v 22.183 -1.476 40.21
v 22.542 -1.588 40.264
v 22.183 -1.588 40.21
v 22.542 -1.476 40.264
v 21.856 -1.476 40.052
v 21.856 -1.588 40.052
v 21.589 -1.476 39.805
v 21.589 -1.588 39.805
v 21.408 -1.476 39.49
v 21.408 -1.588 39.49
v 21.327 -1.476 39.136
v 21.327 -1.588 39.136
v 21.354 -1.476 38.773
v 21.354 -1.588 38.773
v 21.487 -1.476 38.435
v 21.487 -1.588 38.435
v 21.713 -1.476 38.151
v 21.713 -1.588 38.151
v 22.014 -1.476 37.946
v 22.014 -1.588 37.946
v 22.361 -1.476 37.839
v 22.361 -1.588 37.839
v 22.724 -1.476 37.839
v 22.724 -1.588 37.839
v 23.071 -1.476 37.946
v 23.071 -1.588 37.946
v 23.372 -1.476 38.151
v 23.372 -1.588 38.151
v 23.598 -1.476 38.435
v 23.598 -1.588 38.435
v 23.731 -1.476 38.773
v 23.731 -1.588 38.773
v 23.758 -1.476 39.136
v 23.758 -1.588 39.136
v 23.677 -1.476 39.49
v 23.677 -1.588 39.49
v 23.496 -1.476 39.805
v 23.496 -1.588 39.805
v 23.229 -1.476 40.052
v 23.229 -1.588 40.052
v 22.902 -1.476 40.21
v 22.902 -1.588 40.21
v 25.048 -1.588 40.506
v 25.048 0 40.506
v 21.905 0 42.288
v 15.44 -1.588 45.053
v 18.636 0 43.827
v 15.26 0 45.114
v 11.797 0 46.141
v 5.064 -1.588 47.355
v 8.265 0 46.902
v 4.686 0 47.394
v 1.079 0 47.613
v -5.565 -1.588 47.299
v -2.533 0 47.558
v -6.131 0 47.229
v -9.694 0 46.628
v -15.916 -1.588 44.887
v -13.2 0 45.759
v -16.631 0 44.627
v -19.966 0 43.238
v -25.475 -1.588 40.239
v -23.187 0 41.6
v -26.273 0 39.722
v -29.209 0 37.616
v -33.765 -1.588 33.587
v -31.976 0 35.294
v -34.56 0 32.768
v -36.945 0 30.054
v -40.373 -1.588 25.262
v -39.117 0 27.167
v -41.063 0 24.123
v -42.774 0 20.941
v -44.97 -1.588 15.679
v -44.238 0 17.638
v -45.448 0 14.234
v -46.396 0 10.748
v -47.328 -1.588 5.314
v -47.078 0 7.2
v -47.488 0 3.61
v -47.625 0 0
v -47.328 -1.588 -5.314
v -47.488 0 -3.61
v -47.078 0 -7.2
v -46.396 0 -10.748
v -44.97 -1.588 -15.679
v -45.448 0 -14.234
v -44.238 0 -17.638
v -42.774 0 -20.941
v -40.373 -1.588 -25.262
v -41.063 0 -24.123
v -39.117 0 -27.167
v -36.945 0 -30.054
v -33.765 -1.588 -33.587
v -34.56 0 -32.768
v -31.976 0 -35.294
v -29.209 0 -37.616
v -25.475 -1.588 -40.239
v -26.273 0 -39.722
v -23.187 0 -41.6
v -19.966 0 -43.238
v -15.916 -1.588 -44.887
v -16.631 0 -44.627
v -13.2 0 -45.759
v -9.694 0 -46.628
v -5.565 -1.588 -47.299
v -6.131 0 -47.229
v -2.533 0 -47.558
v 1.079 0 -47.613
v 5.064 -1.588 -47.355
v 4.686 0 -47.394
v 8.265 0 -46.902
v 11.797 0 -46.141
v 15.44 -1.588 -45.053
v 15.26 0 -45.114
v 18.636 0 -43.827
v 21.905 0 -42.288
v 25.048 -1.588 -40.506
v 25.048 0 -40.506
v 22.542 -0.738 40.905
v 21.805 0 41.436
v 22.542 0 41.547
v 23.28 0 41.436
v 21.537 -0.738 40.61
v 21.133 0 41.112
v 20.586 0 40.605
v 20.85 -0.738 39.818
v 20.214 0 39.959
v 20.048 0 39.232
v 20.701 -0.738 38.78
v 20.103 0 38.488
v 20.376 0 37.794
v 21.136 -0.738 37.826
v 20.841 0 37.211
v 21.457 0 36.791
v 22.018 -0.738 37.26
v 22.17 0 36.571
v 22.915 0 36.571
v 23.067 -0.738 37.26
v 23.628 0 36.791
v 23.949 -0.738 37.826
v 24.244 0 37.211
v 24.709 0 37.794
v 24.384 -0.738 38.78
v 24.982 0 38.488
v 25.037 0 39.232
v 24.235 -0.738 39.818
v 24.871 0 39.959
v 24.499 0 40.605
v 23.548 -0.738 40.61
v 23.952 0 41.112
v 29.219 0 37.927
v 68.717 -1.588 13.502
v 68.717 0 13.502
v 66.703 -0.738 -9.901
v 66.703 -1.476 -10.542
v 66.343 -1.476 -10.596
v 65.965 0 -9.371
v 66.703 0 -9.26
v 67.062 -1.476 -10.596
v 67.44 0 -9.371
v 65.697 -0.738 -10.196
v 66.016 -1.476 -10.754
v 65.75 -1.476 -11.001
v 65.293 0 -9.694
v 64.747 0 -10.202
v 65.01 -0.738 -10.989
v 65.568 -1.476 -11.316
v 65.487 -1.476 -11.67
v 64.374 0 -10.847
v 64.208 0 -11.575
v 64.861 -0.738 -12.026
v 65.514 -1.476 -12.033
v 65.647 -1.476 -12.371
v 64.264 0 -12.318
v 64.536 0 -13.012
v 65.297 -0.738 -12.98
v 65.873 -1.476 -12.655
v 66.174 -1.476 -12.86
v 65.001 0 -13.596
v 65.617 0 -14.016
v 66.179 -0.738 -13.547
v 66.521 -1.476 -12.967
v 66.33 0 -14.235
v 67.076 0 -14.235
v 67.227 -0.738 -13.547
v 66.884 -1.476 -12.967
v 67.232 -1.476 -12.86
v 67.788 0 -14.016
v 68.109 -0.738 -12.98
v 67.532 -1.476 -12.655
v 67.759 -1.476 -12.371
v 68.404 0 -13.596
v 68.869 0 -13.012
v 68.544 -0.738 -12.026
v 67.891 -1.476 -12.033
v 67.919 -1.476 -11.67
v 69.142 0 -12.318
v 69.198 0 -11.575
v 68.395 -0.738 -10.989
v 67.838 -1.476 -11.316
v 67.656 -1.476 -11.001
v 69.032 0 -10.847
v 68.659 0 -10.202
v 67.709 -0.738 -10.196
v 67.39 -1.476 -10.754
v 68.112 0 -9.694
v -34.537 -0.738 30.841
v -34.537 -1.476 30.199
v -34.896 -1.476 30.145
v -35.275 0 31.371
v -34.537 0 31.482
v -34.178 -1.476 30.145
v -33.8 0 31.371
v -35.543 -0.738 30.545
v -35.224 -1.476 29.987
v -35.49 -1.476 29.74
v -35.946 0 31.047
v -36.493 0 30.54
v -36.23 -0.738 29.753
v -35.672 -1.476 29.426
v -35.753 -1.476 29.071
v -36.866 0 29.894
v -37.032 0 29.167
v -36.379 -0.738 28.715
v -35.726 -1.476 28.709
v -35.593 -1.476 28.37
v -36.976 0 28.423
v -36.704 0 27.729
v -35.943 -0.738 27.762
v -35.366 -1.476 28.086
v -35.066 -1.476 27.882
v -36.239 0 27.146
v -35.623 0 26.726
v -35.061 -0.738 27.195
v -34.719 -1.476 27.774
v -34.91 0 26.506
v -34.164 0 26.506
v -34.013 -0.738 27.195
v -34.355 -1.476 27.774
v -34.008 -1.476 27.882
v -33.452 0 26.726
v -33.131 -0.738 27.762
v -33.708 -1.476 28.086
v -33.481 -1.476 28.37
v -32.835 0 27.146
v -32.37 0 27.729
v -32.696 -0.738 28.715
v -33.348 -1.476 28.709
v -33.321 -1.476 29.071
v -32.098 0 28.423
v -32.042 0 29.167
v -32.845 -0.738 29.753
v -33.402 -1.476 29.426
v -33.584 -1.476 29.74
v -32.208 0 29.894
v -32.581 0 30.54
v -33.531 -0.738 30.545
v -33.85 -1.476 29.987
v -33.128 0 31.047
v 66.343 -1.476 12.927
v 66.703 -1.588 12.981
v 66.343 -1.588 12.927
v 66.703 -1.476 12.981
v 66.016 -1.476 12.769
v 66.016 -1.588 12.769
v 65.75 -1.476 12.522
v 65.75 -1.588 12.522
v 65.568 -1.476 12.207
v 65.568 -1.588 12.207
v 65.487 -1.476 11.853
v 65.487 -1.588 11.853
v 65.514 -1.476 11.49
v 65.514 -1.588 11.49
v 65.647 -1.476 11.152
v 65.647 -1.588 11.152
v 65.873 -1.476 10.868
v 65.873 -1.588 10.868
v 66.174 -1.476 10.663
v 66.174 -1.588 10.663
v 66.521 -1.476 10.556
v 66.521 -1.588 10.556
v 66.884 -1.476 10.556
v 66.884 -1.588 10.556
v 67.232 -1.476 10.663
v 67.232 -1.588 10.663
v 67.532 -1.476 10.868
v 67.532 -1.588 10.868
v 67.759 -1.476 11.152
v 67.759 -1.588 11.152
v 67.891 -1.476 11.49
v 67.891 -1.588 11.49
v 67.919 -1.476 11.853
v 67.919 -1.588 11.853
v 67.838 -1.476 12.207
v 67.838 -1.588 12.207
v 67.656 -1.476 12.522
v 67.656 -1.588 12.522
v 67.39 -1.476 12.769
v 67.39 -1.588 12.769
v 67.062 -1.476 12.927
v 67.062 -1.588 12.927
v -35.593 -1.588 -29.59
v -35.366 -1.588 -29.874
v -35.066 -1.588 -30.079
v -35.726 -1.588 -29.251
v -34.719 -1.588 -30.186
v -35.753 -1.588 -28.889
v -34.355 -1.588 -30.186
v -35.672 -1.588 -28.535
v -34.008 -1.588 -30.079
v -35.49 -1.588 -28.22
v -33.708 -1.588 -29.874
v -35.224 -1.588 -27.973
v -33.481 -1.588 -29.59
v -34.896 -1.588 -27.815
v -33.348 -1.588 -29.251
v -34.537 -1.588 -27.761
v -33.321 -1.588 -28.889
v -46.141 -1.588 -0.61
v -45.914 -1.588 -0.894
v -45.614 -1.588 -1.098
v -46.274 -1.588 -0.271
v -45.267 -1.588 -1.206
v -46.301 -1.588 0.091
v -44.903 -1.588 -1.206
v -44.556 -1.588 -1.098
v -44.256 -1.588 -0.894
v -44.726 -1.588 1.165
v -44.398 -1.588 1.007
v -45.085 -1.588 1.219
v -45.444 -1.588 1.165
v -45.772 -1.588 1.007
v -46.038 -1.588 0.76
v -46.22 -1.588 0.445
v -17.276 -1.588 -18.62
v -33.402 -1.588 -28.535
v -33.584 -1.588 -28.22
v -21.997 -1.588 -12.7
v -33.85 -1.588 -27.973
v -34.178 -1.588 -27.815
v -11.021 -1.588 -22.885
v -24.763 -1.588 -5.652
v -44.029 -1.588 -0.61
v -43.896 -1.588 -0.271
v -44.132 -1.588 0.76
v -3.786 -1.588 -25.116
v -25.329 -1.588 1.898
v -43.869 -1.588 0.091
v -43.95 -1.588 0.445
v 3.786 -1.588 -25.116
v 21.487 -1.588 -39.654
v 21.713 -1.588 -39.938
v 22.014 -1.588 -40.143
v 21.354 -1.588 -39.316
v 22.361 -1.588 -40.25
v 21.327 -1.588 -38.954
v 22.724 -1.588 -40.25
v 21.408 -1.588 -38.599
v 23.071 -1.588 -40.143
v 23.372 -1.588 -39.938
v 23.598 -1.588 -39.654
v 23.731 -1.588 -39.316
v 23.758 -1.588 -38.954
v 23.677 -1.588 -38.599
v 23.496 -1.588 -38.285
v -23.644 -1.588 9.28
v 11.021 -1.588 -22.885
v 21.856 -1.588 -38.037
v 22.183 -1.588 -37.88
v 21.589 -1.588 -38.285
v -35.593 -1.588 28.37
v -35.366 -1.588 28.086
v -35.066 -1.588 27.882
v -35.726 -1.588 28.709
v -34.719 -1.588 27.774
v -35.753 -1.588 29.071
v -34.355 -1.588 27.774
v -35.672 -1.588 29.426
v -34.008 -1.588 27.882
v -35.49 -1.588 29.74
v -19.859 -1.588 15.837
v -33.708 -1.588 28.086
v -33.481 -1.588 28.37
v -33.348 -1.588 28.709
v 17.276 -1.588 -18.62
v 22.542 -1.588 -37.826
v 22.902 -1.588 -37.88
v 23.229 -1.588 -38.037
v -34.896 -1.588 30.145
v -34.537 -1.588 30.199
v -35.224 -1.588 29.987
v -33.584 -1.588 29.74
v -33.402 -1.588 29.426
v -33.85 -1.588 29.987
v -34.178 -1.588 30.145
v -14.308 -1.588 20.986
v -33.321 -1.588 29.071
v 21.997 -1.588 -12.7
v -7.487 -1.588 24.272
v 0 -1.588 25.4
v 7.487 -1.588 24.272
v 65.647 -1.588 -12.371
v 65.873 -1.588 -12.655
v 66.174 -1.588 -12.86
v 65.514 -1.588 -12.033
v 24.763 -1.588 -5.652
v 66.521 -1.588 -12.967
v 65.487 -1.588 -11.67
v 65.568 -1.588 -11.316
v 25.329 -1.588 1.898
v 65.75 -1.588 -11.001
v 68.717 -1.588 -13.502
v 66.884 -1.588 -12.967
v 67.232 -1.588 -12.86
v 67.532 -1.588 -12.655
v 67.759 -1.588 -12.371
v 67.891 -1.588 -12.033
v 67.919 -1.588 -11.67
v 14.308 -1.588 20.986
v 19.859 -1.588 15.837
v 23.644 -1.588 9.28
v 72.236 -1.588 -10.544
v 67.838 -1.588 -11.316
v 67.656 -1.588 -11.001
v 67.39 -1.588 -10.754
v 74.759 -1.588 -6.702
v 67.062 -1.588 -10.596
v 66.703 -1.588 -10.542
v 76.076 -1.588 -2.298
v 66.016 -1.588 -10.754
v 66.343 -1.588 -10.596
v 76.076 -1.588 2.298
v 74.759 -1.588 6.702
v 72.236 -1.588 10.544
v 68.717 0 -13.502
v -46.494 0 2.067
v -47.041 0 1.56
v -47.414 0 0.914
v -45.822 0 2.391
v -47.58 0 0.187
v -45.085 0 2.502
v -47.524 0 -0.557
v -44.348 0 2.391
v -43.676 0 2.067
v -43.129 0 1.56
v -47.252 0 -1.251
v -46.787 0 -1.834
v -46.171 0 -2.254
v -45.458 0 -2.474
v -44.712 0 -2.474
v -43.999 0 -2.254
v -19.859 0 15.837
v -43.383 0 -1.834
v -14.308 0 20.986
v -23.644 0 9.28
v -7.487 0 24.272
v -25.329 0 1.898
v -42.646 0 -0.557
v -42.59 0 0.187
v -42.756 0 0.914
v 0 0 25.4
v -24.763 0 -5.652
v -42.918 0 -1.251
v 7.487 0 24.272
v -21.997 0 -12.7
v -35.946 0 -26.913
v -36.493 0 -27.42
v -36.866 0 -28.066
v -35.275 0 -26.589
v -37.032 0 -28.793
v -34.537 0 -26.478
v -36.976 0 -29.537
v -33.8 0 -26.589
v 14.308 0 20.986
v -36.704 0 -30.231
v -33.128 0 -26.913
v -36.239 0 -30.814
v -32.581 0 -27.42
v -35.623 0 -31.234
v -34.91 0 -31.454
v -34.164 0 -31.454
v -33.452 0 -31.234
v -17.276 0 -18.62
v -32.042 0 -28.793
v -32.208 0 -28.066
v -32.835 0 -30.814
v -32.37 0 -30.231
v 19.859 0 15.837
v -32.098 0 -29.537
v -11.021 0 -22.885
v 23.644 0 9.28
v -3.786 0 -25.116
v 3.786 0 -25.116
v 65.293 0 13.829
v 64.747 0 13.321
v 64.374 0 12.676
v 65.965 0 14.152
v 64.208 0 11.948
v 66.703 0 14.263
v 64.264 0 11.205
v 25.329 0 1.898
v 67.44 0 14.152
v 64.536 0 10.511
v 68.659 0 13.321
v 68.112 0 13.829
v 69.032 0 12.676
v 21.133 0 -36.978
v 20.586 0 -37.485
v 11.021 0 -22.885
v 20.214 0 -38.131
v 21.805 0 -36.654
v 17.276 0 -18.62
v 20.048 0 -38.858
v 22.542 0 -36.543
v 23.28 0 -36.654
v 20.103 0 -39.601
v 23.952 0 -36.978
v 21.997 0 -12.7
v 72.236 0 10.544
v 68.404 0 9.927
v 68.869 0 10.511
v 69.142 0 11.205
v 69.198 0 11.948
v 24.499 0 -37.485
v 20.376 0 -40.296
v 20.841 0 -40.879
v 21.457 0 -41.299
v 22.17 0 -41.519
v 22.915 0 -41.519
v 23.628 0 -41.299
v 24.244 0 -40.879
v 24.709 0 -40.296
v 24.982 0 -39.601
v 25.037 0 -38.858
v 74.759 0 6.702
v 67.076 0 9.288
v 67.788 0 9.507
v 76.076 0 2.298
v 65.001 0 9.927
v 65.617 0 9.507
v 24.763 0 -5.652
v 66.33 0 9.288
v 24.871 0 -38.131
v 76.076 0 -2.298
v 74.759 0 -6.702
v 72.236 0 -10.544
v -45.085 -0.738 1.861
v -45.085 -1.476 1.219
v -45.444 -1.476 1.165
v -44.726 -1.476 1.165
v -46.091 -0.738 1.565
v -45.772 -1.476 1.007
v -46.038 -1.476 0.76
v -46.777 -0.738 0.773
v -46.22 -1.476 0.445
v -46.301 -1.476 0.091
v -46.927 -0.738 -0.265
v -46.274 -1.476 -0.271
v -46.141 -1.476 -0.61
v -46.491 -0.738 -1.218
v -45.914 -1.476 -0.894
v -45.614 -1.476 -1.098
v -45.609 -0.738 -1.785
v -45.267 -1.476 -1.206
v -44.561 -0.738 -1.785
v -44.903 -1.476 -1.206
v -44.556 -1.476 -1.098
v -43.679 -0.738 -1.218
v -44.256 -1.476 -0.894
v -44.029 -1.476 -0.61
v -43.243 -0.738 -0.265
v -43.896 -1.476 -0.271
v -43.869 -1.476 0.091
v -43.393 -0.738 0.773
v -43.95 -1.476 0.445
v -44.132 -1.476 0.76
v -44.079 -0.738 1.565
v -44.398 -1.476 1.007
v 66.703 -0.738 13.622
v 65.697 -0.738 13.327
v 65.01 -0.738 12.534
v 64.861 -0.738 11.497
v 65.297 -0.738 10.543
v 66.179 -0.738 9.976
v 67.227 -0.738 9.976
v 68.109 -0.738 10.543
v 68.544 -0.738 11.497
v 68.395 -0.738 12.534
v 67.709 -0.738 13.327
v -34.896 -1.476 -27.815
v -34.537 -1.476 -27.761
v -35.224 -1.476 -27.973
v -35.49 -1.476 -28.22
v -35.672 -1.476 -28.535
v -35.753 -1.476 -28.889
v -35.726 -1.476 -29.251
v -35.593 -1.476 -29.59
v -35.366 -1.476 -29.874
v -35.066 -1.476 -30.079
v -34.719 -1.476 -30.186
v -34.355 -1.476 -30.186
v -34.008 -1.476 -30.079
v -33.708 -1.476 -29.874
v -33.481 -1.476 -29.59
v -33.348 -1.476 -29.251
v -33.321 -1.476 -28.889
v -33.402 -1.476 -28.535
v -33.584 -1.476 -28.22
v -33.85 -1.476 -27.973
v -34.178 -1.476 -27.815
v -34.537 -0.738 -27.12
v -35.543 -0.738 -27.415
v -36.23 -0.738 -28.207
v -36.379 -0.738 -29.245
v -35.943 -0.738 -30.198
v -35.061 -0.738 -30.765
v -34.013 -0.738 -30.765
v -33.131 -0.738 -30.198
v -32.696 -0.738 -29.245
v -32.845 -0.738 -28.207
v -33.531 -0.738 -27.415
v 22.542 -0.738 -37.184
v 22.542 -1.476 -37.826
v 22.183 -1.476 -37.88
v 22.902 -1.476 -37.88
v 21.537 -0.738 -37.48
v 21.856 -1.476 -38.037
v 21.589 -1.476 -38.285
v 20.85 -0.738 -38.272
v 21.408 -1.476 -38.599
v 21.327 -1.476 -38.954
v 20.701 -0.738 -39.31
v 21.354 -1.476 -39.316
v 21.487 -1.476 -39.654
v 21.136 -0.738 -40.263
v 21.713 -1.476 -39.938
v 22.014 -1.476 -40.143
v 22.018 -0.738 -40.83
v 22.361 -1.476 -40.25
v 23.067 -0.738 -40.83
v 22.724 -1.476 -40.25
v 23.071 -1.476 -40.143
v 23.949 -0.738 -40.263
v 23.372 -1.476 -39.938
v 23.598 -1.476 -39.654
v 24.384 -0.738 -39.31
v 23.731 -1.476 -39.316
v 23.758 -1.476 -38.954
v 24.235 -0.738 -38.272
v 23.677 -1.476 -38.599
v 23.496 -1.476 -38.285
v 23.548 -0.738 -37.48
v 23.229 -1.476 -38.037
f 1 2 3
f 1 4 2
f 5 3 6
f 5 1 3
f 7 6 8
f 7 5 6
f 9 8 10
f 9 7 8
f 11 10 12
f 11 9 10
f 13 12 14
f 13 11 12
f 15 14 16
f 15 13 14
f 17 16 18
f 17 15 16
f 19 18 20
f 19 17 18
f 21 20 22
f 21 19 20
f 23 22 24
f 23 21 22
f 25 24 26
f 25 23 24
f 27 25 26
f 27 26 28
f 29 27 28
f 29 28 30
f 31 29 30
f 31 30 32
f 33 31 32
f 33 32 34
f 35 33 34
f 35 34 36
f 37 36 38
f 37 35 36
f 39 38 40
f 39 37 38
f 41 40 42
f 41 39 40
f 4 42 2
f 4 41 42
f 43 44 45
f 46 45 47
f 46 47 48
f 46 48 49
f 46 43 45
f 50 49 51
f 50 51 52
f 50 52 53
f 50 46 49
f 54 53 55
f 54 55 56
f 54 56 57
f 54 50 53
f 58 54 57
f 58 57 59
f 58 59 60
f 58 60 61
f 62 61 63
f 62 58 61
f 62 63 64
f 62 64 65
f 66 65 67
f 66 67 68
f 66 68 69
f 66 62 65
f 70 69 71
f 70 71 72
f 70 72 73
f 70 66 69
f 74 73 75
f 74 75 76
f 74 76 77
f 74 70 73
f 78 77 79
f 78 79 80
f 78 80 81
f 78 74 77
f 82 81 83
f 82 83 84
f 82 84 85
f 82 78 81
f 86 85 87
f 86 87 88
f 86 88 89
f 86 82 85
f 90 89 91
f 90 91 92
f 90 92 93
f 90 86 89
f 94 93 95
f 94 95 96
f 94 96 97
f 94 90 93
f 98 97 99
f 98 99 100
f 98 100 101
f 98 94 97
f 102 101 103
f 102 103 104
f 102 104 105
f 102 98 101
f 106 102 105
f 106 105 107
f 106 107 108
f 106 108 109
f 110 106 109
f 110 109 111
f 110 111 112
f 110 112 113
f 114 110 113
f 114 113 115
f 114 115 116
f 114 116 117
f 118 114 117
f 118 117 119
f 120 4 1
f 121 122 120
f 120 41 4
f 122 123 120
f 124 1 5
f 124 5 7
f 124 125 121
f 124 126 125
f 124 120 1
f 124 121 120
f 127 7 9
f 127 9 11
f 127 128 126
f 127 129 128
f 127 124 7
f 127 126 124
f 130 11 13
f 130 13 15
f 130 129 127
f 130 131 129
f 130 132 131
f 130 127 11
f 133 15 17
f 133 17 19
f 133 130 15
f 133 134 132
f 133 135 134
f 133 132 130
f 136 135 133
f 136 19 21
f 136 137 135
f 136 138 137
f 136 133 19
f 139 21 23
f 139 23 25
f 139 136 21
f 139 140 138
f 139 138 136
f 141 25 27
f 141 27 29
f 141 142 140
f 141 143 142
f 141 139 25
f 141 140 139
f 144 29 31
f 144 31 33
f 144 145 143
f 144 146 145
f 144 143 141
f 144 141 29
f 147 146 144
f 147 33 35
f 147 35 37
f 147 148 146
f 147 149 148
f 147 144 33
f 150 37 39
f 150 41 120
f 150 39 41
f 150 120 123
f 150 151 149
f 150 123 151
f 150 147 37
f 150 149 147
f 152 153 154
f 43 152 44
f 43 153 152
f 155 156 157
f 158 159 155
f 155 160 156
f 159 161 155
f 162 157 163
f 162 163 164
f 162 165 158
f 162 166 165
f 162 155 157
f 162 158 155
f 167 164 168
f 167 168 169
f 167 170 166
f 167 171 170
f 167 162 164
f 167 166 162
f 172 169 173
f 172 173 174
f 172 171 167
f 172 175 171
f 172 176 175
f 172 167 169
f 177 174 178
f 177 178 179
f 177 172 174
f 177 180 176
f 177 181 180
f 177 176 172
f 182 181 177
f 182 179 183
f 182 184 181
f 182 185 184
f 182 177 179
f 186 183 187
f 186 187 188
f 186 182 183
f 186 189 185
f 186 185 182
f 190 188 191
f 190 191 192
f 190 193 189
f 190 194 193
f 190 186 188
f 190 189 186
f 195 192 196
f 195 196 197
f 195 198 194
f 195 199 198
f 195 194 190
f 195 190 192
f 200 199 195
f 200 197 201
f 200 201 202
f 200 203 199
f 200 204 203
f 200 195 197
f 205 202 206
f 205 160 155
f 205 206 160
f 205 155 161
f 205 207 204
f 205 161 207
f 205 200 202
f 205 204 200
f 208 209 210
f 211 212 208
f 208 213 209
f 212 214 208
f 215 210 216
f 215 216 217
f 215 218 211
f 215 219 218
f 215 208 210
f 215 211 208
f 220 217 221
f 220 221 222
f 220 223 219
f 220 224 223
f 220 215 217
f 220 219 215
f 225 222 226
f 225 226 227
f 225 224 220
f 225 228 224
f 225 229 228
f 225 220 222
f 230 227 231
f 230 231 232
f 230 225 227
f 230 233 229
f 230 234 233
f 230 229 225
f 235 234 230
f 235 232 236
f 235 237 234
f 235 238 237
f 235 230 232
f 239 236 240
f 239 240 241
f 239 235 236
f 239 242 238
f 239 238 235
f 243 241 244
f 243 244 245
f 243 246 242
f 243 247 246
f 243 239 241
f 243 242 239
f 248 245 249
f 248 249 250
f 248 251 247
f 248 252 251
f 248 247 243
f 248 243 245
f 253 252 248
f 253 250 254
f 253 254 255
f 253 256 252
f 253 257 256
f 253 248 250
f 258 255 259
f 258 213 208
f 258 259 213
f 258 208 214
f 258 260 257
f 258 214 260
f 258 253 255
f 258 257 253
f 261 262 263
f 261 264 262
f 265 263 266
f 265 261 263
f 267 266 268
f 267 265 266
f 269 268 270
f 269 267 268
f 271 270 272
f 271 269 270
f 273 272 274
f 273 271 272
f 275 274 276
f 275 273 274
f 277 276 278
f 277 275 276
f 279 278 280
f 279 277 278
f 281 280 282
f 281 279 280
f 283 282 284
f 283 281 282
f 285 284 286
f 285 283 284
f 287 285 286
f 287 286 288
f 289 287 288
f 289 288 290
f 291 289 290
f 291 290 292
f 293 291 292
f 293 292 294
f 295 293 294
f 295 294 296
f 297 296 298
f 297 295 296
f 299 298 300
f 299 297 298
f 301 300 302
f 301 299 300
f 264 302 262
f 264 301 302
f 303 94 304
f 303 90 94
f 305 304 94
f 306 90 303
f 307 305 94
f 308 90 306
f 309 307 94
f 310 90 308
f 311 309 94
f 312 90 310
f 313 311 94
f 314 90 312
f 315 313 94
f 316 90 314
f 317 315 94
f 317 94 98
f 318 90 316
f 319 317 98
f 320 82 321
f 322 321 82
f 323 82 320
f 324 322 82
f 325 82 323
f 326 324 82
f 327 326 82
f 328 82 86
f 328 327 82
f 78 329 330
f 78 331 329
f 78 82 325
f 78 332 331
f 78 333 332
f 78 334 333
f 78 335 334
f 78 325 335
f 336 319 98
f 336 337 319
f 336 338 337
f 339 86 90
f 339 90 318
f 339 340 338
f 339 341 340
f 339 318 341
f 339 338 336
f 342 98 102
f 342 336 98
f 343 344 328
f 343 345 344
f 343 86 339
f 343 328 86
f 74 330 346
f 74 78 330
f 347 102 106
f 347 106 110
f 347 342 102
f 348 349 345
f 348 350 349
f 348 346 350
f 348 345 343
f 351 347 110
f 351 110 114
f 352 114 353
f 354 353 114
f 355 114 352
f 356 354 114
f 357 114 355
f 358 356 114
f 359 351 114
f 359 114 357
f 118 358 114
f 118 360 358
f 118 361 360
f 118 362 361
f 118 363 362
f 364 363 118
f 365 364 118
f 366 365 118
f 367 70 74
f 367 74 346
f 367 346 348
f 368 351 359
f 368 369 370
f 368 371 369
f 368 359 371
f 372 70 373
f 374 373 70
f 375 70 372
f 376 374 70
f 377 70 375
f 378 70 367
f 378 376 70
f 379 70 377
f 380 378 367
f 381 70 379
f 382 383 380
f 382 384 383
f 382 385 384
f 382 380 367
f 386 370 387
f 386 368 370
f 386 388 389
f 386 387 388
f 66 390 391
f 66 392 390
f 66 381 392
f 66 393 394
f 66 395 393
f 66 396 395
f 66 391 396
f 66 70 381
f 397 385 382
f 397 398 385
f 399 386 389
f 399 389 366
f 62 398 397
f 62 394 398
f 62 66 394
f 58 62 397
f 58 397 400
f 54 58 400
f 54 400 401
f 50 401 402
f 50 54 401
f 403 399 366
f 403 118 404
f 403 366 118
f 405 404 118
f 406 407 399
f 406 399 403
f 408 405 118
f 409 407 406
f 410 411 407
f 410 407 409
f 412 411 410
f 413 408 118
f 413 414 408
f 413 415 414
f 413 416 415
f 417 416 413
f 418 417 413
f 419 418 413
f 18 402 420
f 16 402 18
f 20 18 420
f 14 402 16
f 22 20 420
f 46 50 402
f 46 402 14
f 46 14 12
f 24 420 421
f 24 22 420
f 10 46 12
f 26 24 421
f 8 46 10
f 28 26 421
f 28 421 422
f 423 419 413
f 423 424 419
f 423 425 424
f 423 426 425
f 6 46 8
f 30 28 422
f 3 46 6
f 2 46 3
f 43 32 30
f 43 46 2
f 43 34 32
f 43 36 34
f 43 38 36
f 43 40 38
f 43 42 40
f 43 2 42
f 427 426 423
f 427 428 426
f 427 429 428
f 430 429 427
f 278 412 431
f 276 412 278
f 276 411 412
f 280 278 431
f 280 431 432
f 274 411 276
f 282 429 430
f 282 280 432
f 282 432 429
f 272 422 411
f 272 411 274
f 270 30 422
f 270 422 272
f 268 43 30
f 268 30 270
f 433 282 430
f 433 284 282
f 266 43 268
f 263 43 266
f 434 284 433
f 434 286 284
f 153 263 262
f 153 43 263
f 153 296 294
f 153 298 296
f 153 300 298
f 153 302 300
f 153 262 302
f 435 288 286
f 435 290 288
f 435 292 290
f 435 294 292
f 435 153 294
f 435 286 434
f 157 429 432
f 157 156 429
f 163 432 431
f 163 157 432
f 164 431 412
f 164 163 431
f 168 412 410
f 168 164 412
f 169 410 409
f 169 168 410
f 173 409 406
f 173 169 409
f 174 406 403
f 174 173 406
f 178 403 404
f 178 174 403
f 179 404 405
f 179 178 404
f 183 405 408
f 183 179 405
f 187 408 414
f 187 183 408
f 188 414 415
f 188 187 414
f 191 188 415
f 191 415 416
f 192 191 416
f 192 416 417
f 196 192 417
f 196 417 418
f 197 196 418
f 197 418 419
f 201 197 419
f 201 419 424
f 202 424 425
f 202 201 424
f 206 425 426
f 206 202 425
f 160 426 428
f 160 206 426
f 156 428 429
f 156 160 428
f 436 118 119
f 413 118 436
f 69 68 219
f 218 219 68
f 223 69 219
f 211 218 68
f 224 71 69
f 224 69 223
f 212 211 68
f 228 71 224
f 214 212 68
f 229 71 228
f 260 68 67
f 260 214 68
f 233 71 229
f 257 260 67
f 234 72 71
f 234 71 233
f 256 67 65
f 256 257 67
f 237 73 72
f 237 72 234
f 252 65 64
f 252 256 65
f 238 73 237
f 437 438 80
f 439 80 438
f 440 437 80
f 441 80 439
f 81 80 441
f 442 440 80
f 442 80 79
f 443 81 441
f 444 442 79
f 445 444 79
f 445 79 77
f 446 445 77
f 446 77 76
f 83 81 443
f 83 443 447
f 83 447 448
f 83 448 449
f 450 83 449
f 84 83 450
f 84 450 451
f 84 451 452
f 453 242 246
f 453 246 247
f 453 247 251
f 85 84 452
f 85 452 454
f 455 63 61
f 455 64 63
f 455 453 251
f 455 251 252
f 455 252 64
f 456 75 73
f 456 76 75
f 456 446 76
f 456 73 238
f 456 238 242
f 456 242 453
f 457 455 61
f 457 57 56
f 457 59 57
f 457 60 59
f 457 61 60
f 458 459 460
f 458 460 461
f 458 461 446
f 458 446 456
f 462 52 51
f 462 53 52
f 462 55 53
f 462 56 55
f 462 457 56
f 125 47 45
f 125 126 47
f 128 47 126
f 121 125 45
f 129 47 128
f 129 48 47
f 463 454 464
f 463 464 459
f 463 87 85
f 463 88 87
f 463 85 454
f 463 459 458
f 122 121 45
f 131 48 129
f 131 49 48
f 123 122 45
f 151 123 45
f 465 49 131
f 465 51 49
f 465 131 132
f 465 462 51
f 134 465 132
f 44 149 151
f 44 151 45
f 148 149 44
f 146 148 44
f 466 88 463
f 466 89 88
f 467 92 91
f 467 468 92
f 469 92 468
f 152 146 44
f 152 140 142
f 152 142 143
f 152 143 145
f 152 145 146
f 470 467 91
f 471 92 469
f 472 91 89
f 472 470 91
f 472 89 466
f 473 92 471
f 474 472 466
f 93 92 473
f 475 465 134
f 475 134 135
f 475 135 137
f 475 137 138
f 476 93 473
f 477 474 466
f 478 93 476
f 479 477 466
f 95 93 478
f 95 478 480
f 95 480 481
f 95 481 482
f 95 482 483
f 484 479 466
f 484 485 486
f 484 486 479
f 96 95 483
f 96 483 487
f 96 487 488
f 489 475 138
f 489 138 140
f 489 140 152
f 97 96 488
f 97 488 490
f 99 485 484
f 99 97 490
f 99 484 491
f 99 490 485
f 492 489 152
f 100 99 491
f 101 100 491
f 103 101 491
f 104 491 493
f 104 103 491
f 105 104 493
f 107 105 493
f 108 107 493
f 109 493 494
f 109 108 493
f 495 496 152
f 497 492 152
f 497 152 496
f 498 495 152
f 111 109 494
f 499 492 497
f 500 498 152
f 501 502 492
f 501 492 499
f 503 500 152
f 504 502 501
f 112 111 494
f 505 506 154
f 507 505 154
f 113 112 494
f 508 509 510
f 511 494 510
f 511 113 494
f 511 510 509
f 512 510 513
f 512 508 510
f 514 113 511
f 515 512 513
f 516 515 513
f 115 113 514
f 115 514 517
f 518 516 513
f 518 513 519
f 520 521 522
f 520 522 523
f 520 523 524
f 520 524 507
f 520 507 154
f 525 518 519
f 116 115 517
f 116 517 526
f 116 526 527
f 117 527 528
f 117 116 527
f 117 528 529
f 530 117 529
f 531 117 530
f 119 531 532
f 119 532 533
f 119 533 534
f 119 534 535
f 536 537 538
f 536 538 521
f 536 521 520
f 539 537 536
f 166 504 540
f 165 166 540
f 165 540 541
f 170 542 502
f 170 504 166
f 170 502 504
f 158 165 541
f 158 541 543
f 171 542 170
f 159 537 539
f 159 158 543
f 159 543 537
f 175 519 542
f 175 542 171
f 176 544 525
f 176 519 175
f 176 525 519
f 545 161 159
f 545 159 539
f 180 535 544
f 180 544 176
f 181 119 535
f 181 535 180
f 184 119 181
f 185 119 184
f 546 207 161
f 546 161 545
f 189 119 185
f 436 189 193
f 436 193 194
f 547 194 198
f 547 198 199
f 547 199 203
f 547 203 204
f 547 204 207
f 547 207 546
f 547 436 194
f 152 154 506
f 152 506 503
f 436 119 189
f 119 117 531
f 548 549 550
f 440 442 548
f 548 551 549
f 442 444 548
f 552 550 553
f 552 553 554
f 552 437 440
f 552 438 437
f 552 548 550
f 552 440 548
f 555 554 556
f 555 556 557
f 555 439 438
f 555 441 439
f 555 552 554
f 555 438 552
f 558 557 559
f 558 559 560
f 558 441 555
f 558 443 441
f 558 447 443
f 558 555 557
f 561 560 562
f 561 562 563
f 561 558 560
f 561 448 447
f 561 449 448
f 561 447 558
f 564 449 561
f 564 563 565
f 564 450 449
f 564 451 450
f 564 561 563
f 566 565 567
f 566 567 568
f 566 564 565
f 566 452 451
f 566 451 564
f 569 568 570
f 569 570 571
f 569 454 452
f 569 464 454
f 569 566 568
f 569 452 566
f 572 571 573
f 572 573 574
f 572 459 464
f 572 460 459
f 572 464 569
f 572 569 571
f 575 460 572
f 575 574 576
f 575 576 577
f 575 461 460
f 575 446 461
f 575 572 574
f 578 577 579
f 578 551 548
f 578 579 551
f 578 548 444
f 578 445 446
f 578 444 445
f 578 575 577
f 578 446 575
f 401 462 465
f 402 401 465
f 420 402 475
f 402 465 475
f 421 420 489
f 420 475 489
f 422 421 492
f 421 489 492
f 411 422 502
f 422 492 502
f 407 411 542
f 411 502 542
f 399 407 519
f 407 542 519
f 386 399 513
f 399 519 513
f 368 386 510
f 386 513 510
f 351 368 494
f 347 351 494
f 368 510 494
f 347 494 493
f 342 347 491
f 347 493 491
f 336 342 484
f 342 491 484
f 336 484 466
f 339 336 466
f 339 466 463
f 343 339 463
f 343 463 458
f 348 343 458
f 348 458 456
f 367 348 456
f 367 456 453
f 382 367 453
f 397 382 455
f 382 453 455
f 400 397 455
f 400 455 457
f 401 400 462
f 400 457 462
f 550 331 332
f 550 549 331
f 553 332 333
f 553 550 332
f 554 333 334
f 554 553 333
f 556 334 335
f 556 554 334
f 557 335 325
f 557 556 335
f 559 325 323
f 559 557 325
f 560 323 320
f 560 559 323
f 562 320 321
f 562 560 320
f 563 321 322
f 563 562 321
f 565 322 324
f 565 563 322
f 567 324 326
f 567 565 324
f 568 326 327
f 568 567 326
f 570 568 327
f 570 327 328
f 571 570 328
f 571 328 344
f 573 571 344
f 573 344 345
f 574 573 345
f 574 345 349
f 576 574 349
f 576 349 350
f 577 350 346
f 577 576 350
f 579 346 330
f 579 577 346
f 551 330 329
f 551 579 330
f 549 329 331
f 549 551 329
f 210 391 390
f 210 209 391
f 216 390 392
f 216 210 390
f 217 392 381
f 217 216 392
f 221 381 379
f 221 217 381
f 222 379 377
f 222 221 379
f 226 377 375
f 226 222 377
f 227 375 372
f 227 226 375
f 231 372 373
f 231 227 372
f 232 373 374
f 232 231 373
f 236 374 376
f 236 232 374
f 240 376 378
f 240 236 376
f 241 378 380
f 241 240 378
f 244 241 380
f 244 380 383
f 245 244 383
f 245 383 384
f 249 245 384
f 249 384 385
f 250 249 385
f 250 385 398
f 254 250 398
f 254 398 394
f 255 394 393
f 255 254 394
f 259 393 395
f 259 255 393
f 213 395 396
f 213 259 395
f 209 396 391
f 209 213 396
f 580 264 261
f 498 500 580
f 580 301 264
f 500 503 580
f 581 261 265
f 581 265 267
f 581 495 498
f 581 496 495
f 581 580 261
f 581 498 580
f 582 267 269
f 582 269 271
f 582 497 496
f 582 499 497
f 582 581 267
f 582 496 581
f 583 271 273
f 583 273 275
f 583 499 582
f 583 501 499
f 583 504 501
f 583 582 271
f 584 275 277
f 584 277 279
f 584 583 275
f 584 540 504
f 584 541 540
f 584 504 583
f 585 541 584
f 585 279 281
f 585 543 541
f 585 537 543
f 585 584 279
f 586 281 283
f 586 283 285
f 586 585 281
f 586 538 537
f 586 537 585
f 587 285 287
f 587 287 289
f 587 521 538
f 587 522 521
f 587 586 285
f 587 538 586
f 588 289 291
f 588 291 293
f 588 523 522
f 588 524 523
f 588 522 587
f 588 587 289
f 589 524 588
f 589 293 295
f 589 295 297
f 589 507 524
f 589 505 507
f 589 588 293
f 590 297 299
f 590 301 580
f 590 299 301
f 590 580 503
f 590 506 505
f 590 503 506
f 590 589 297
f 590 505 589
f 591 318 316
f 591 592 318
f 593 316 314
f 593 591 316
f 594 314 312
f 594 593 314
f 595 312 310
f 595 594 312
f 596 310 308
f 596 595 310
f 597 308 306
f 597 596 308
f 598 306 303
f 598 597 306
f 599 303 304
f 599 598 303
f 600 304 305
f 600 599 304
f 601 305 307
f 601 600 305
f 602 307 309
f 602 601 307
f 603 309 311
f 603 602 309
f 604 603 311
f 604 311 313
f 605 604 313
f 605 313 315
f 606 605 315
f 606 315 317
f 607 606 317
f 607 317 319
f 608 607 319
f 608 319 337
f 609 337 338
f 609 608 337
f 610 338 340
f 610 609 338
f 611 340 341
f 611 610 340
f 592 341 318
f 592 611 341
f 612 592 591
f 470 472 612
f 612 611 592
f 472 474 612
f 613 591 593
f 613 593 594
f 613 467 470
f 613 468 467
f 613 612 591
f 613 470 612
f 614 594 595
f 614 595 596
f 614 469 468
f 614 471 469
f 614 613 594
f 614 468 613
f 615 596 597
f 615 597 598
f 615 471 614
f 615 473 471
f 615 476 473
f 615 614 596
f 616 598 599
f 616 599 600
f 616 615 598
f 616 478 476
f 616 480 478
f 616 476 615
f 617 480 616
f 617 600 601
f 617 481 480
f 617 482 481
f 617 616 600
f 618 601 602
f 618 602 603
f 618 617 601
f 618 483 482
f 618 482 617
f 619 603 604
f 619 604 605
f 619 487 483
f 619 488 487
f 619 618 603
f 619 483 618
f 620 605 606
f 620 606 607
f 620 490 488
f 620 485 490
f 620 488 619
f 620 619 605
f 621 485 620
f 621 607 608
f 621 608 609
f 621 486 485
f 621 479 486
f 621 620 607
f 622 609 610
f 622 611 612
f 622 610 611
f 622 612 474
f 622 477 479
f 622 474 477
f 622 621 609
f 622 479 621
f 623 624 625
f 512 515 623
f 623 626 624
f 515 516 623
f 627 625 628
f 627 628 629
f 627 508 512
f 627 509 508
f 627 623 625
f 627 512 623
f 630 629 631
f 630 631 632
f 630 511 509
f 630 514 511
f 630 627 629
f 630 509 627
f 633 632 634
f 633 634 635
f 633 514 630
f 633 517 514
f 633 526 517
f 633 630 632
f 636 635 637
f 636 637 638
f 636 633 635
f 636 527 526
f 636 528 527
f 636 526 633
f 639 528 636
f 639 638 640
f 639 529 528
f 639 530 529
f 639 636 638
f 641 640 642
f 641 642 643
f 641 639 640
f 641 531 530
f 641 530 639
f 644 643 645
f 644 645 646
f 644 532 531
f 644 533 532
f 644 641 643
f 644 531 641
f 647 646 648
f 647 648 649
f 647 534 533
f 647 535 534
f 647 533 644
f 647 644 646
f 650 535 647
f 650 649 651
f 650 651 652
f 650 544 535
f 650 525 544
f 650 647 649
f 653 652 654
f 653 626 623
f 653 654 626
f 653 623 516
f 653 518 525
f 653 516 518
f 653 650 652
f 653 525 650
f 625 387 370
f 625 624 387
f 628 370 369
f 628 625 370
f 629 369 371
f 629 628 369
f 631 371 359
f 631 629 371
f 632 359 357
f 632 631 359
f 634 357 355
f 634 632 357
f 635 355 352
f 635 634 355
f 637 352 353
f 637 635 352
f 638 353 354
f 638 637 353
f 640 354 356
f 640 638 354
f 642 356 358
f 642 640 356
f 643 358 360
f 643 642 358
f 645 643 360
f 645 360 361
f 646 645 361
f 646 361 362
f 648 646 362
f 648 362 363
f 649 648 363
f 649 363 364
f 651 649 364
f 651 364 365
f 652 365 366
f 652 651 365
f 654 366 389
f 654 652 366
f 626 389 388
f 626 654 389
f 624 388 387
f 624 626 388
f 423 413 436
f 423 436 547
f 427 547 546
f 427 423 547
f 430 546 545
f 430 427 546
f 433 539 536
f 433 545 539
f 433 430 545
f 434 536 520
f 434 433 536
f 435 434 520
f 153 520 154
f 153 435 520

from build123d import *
from build123d.topology import SkipClean

# Parameters (mm, degrees)
SKETCH1_R                                         = 47.625
BOSS_EXTRUDE1_DEPTH                               = 24.13
SKETCH2_R                                         = 46.0375
CUT_EXTRUDE1_DEPTH                                = 20.955
SKETCH3_R                                         = 30.48
CUT_EXTRUDE2_DEPTH                                = 71.536467696
BOSS_EXTRUDE2_START                               = -24.13
BOSS_EXTRUDE2_DEPTH                               = 24.13
CUT_EXTRUDE3_DEPTH                                = 20.955
BOSS_EXTRUDE3_START                               = 3.81
BOSS_EXTRUDE3_DEPTH                               = 3.81
SKETCH7_R                                         = 11.176
CUT_EXTRUDE4_DEPTH                                = 3.81
CHAMFER1_SIZE                                     = 0.762
SKETCH8_R                                         = 5.08
CUT_EXTRUDE5_DEPTH                                = 93.163254725
CSK_FOR_M2_5_FLAT_HEAD_MACHINE_SCREW1_D           = 2.9
CSK_FOR_M2_5_FLAT_HEAD_MACHINE_SCREW1_CSINK_D     = 5.5
CSK_FOR_M2_5_FLAT_HEAD_MACHINE_SCREW1_CSINK_ANGLE = 90
CIRPATTERN1_COUNT                                 = 3
BOSS_EXTRUDE4_DEPTH                               = 5.588
SKETCH12_R                                        = 32.0675
SKETCH12_R_2                                      = 30.48
BOSS_EXTRUDE5_DEPTH                               = 5.588
FILLET2_R                                         = 3.175
F_10_32_TAPPED_HOLE1_D                            = 4.0386
CIRPATTERN2_COUNT                                 = 6
BOSS_EXTRUDE6_REACH                               = 96.68
SKETCH19_R                                        = 2.54
FILLET3_R                                         = 3.175
F_4_40_TAPPED_HOLE1_D                             = 2.2606
F_4_40_TAPPED_HOLE1_DEPTH                         = 7.62
F_4_40_TAPPED_HOLE1_TIP                           = 0.679152758
BOSS_EXTRUDE8_START                               = 1.5875
BOSS_EXTRUDE8_DEPTH                               = 1.5875
CUT_EXTRUDE6_START                                = -29.718
CUT_EXTRUDE6_DEPTH                                = 29.718
CSK_FOR_2_FLAT_HEAD_SOCKET_CAP_SCREW1_A_COUNT     = 2
CSK_FOR_2_FLAT_HEAD_SOCKET_CAP_SCREW1_A_PITCH     = 57.960158765
CSK_FOR_2_FLAT_HEAD_SOCKET_CAP_SCRE_2_COUNT       = 2
CSK_FOR_2_FLAT_HEAD_SOCKET_CAP_SCRE_2_PITCH       = 78.089510659
CSK_FOR_2_FLAT_HEAD_SOCKET_CAP_SCRE_3_COUNT       = 2
CSK_FOR_2_FLAT_HEAD_SOCKET_CAP_SCRE_3_PITCH       = 88.800115089
CSK_FOR_2_FLAT_HEAD_SOCKET_CAP_SCRE_4_COUNT       = 2
CSK_FOR_2_FLAT_HEAD_SOCKET_CAP_SCRE_4_PITCH       = 78.089510659
CSK_FOR_2_FLAT_HEAD_SOCKET_CAP_SCRE_5_COUNT       = 2
CSK_FOR_2_FLAT_HEAD_SOCKET_CAP_SCRE_5_PITCH       = 67.315682226
CSK_FOR_2_FLAT_HEAD_SOCKET_CAP_SCRE_6_COUNT       = 2
CSK_FOR_2_FLAT_HEAD_SOCKET_CAP_SCRE_6_PITCH       = 51.908600383
SKETCH26_R                                        = 25.4
CUT_EXTRUDE7_DEPTH                                = 1.5875


with BuildPart() as part:
    # Sketch1 → Boss-Extrude1 (new body)
    with BuildSketch(Plane(origin=(0, 0, 0), x_dir=(1, 0, 0), z_dir=(0, 1, 0))):
        with Locations(Location((0, 0, 0), (0, 0, 90))):
            Circle(SKETCH1_R)
    extrude(amount=BOSS_EXTRUDE1_DEPTH)

    # Sketch2 → Cut-Extrude1 (cut)
    with BuildSketch(Plane.XZ):
        with Locations(Location((0, 0, 0), (0, 0, 270))):
            Circle(SKETCH2_R)
    extrude(amount=-CUT_EXTRUDE1_DEPTH, mode=Mode.SUBTRACT)

    # Sketch3 → Cut-Extrude2 (cut, through all)
    with BuildSketch(Plane.XZ.offset(-20.955)):
        with Locations(Location((0, 0, 0), (0, 0, 270))):
            Circle(SKETCH3_R)
    extrude(amount=-CUT_EXTRUDE2_DEPTH, mode=Mode.SUBTRACT)

    # Sketch4 → Boss-Extrude2 (add)
    with BuildSketch(Plane(origin=(0, 24.13, 0), x_dir=(1, 0, 0), z_dir=(0, 1, 0)).offset(BOSS_EXTRUDE2_START)):
        with BuildLine():
            Line((25.047860479, 40.506114482), (68.717466826, 13.502038161))
            ThreePointArc((68.717466826, 13.502038161), (76.24318, 0), (68.717466826, -13.502038161))
            Line((68.717466826, -13.502038161), (25.047860479, -40.506114482))
            ThreePointArc((25.047860479, -40.506114482), (47.625, 0), (25.047860479, 40.506114482))
        make_face()
    extrude(amount=BOSS_EXTRUDE2_DEPTH)

    # Sketch5 → Cut-Extrude3 (cut)
    with BuildSketch(Plane.XZ):
        with BuildLine():
            Line((24.212931796, -39.155910666), (67.882538144, -12.151834345))
            ThreePointArc((67.882538144, -12.151834345), (74.65568, 0), (67.882538144, 12.151834345))
            Line((67.882538144, 12.151834345), (24.212931796, 39.155910666))
            ThreePointArc((24.212931796, 39.155910666), (46.0375, 0), (24.212931796, -39.155910666))
        make_face()
    extrude(amount=-CUT_EXTRUDE3_DEPTH, mode=Mode.SUBTRACT)

    # Sketch6 → Boss-Extrude3 (add)
    with BuildSketch(Plane.XZ.offset(-20.955).offset(BOSS_EXTRUDE3_START)):
        with BuildLine():
            Line((53.153553418, 21.25983098), (46.04773497, 25.653872505))
            Line((46.04773497, 25.653872505), (46.882663653, 27.004076321))
            Line((46.882663653, 27.004076321), (68.717466826, 13.502038161))
            ThreePointArc((68.717466826, 13.502038161), (76.24318, 0), (68.717466826, -13.502038161))
            Line((68.717466826, -13.502038161), (46.882663653, -27.004076321))
            Line((46.882663653, -27.004076321), (46.04773497, -25.653872505))
            Line((46.04773497, -25.653872505), (53.153553418, -21.25983098))
            ThreePointArc((53.153553418, -21.25983098), (56.162954155, -15.965000538), (53.331952458, -10.572677144))
            ThreePointArc((53.331952458, -10.572677144), (47.66818, 0), (53.331952458, 10.572677144))
            ThreePointArc((53.331952458, 10.572677144), (56.162954155, 15.965000538), (53.153553418, 21.25983098))
        make_face()
    extrude(amount=-BOSS_EXTRUDE3_DEPTH)

    # Sketch7 → Cut-Extrude4 (cut)
    with BuildSketch(Plane(origin=(0, 24.13, 0), x_dir=(1, 0, 0), z_dir=(0, 1, 0))):
        with Locations(Location((60.36818, 0, 0), (0, 0, 270))):
            Circle(SKETCH7_R)
    extrude(amount=-CUT_EXTRUDE4_DEPTH, mode=Mode.SUBTRACT)

    # Chamfer1
    chamfer1_edges = [part.edges().sort_by_distance(p)[0] for p in [
        (60.36818, 24.13, -11.176),
    ]]
    chamfer(chamfer1_edges, length=CHAMFER1_SIZE)

    # Sketch8 → Cut-Extrude5 (cut, through all)
    with BuildSketch(Plane(origin=(0, 20.32, 0), x_dir=(1, 0, 0), z_dir=(0, 1, 0))):
        with Locations(Location((60.36818, 0, 0), (0, 0, 270))):
            Circle(SKETCH8_R)
    extrude(amount=-CUT_EXTRUDE5_DEPTH, mode=Mode.SUBTRACT)

    # CSK for M2.5 Flat Head Machine Screw1 (through all)
    with Locations(Plane.XZ.offset(-17.145)):
        with Locations((67.36818, 0)):
            csk_for_m2_5_flat_head_machine_screw1 = CounterSinkHole(CSK_FOR_M2_5_FLAT_HEAD_MACHINE_SCREW1_D / 2, CSK_FOR_M2_5_FLAT_HEAD_MACHINE_SCREW1_CSINK_D / 2, counter_sink_angle=CSK_FOR_M2_5_FLAT_HEAD_MACHINE_SCREW1_CSINK_ANGLE)

    # CirPattern1: CSK for M2.5 Flat Head Machine Screw1 ×3 about axis
    cirpattern1_axis = Axis((60.36818, 0, 0), (0, 1, 0))
    for i in range(1, CIRPATTERN1_COUNT):
        add(csk_for_m2_5_flat_head_machine_screw1.rotate(cirpattern1_axis, i * 360 / CIRPATTERN1_COUNT), mode=Mode.SUBTRACT)

    # Sketch11 → Boss-Extrude4 (add)
    with BuildSketch(Plane(origin=(0, 24.13, 0), x_dir=(1, 0, 0), z_dir=(0, 1, 0))):
        with BuildLine():
            Line((-30.83887705, 27.39889836), (-23.975769003, 18.820013302))
            ThreePointArc((-23.975769003, 18.820013302), (-19.040705049, 23.800881312), (-13.098014904, 27.522216582))
            Line((-13.098014904, 27.522216582), (-19.96112295, 36.10110164))
            ThreePointArc((-19.96112295, 36.10110164), (-29.75110164, 37.18887705), (-30.83887705, 27.39889836))
        make_face()
        with BuildLine():
            Line((19.729280139, 36.286575888), (12.821655, 27.652044464))
            ThreePointArc((12.821655, 27.652044464), (19.040705049, 23.800881312), (24.163094721, 18.578892687))
            Line((24.163094721, 18.578892687), (31.070719861, 27.213424112))
            ThreePointArc((31.070719861, 27.213424112), (29.936575888, 37.420719861), (19.729280139, 36.286575888))
        make_face()
    boss_extrude4 = extrude(amount=BOSS_EXTRUDE4_DEPTH)

    # Mirror1: Boss-Extrude4 across plane
    with SkipClean():  # the faces are left unmerged after this step: merging them gives an invalid solid
        add(boss_extrude4.mirror(Plane.XY))

    # Sketch12 → Boss-Extrude5 (add)
    with BuildSketch(Plane(origin=(0, 24.13, 0), x_dir=(1, 0, 0), z_dir=(0, 1, 0))):
        Circle(SKETCH12_R)
        with Locations(Location((0, 0, 0), (0, 0, 90))):
            Circle(SKETCH12_R_2, mode=Mode.SUBTRACT)
    extrude(amount=BOSS_EXTRUDE5_DEPTH)

    # Fillet2
    fillet2_edges = [part.edges().sort_by_distance(p)[0] for p in [
        (-24.993040349, 26.924, 20.091602484),
        (-14.115286249, 26.924, 28.793805764),
        (13.841247416, 26.924, 28.926534985),
        (25.182687137, 26.924, 19.853383208),
        (25.182687137, 26.924, -19.853383208),
        (13.841247416, 26.924, -28.926534985),
        (-14.115286249, 26.924, -28.793805764),
        (-24.993040349, 26.924, -20.091602484),
    ]]
    fillet(fillet2_edges, radius=FILLET2_R)

    # #10-32 Tapped Hole1 (through all)
    with Locations(Plane(origin=(0, 29.718, 0), x_dir=(-1, 0, 0), z_dir=(0, 1, 0))):
        with Locations((25.4, -31.75), (-25.4, -31.75), (25.4, 31.75), (-25.4, 31.75)):
            Hole(F_10_32_TAPPED_HOLE1_D / 2)

    # Sketch17 → #4 Clearance Hole1 (revolve, cut)
    with BuildSketch(Plane(origin=(0, 24.13, -35.56), x_dir=(0, 0, 1), z_dir=(1, 0, 0))):
        Polygon((0, 0), (0, 84.038574487), (1.63195, 83.058), (1.63195, 0), align=None)
    f_4_clearance_hole1 = revolve(axis=Axis((0, 30.48, -35.56), (0, -1, 0)), mode=Mode.SUBTRACT)

    # CirPattern2: #4 Clearance Hole1 ×6 about axis
    cirpattern2_axis = Axis((0, 0, 0), (0, 1, 0))
    for i in range(1, CIRPATTERN2_COUNT):
        add(f_4_clearance_hole1.rotate(cirpattern2_axis, i * 360 / CIRPATTERN2_COUNT), mode=Mode.SUBTRACT)

    # Boss-Extrude6: up to this face of the body (flat: up to its plane)
    boss_extrude6_end = Plane(part.part.faces().sort_by_distance((-44.661893979, 20.955, 0))[0])
    # Sketch19 → Boss-Extrude6 (add, up to the picked face)
    with BuildSketch(Plane.XZ, mode=Mode.PRIVATE) as boss_extrude6_sk1:
        with Locations((-45.085, 0)):
            Circle(SKETCH19_R)
    boss_extrude6_tool1 = split(extrude(boss_extrude6_sk1.sketch, amount=-BOSS_EXTRUDE6_REACH, mode=Mode.PRIVATE), bisect_by=boss_extrude6_end, keep=Keep.BOTH, mode=Mode.PRIVATE)
    # Sketch19 → Boss-Extrude6 (add, up to the picked face)
    with BuildSketch(Plane.XZ, mode=Mode.PRIVATE) as boss_extrude6_sk2:
        with Locations((-34.537113718, 28.980079383)):
            Circle(SKETCH19_R)
    boss_extrude6_tool2 = split(extrude(boss_extrude6_sk2.sketch, amount=-BOSS_EXTRUDE6_REACH, mode=Mode.PRIVATE), bisect_by=boss_extrude6_end, keep=Keep.BOTH, mode=Mode.PRIVATE)
    # Sketch19 → Boss-Extrude6 (add, up to the picked face)
    with BuildSketch(Plane.XZ, mode=Mode.PRIVATE) as boss_extrude6_sk3:
        with Locations((66.702734661, 11.761491808)):
            Circle(SKETCH19_R)
    boss_extrude6_tool3 = split(extrude(boss_extrude6_sk3.sketch, amount=-BOSS_EXTRUDE6_REACH, mode=Mode.PRIVATE), bisect_by=boss_extrude6_end, keep=Keep.BOTH, mode=Mode.PRIVATE)
    # Sketch19 → Boss-Extrude6 (add, up to the picked face)
    with BuildSketch(Plane.XZ, mode=Mode.PRIVATE) as boss_extrude6_sk4:
        with Locations((22.5425, 39.04475533)):
            Circle(SKETCH19_R)
    boss_extrude6_tool4 = split(extrude(boss_extrude6_sk4.sketch, amount=-BOSS_EXTRUDE6_REACH, mode=Mode.PRIVATE), bisect_by=boss_extrude6_end, keep=Keep.BOTH, mode=Mode.PRIVATE)
    # Sketch19 → Boss-Extrude6 (add, up to the picked face)
    with BuildSketch(Plane.XZ, mode=Mode.PRIVATE) as boss_extrude6_sk5:
        with Locations((66.702734661, -11.761491808)):
            Circle(SKETCH19_R)
    boss_extrude6_tool5 = split(extrude(boss_extrude6_sk5.sketch, amount=-BOSS_EXTRUDE6_REACH, mode=Mode.PRIVATE), bisect_by=boss_extrude6_end, keep=Keep.BOTH, mode=Mode.PRIVATE)
    # Sketch19 → Boss-Extrude6 (add, up to the picked face)
    with BuildSketch(Plane.XZ, mode=Mode.PRIVATE) as boss_extrude6_sk6:
        with Locations((22.5425, -39.04475533)):
            Circle(SKETCH19_R)
    boss_extrude6_tool6 = split(extrude(boss_extrude6_sk6.sketch, amount=-BOSS_EXTRUDE6_REACH, mode=Mode.PRIVATE), bisect_by=boss_extrude6_end, keep=Keep.BOTH, mode=Mode.PRIVATE)
    # Sketch19 → Boss-Extrude6 (add, up to the picked face)
    with BuildSketch(Plane.XZ, mode=Mode.PRIVATE) as boss_extrude6_sk7:
        with Locations((-34.537113718, -28.980079383)):
            Circle(SKETCH19_R)
    boss_extrude6_tool7 = split(extrude(boss_extrude6_sk7.sketch, amount=-BOSS_EXTRUDE6_REACH, mode=Mode.PRIVATE), bisect_by=boss_extrude6_end, keep=Keep.BOTH, mode=Mode.PRIVATE)
    add(boss_extrude6_tool1.solids().sort_by(Axis((-45.085, 0, 0), (0, 1, 0)))[0])
    add(boss_extrude6_tool2.solids().sort_by(Axis((-34.537114, 0, 28.980079), (0, 1, 0)))[0])
    add(boss_extrude6_tool3.solids().sort_by(Axis((66.702735, 0, 11.761492), (0, 1, 0)))[0])
    add(boss_extrude6_tool4.solids().sort_by(Axis((22.5425, 0, 39.044755), (0, 1, 0)))[0])
    add(boss_extrude6_tool5.solids().sort_by(Axis((66.702735, 0, -11.761492), (0, 1, 0)))[0])
    add(boss_extrude6_tool6.solids().sort_by(Axis((22.5425, 0, -39.044755), (0, 1, 0)))[0])
    add(boss_extrude6_tool7.solids().sort_by(Axis((-34.537114, 0, -28.980079), (0, 1, 0)))[0])

    # Fillet3
    fillet3_edges = [part.edges().sort_by_distance(p)[0] for p in [
        (-45.976012324, 10.4775, 2.378591398),
        (-45.976012324, 10.4775, -2.378591398),
        (-33.690739678, 10.4775, 31.374917788),
        (-36.748597837, 10.4775, 27.730704342),
        (69.188582602, 8.5725, 11.239802231),
        (65.201015971, 8.5725, 13.810013464),
        (20.928085586, 10.4775, 41.005690336),
        (25.049788012, 10.4775, 38.638421936),
        (65.201015971, 8.5725, -13.810013464),
        (69.188582602, 8.5725, -11.239802231),
        (25.049788012, 10.4775, -38.638421936),
        (20.928085586, 10.4775, -41.005690336),
        (-33.690739678, 10.4775, -31.374917788),
        (-36.748597837, 10.4775, -27.730704342),
    ]]
    fillet(fillet3_edges, radius=FILLET3_R)

    # #4-40 Tapped Hole1
    with Locations(Plane.XZ):
        with Locations((-34.537113718, 28.980079383), (22.5425, 39.04475533), (66.702734661, 11.761491808), (66.702734661, -11.761491808), (22.5425, -39.04475533), (-34.537113718, -28.980079383), (-45.085, 0)):
            Hole(F_4_40_TAPPED_HOLE1_D / 2, depth=F_4_40_TAPPED_HOLE1_DEPTH)
            with Locations((0, 0, -(F_4_40_TAPPED_HOLE1_DEPTH + F_4_40_TAPPED_HOLE1_TIP / 2))):  # 118° drill point
                Cone(0, F_4_40_TAPPED_HOLE1_D / 2, F_4_40_TAPPED_HOLE1_TIP, mode=Mode.SUBTRACT)

    # Sketch22 → Boss-Extrude8 (add)
    with BuildSketch(Plane.XZ.offset(BOSS_EXTRUDE8_START)):
        with BuildLine():
            Line((68.717466826, 13.502038161), (25.047860479, 40.506114482))
            ThreePointArc((25.047860479, 40.506114482), (-47.625, 0), (25.047860479, -40.506114482))
            Line((25.047860479, -40.506114482), (68.717466826, -13.502038161))
            ThreePointArc((68.717466826, -13.502038161), (76.24318, 0), (68.717466826, 13.502038161))
        make_face()
    extrude(amount=-BOSS_EXTRUDE8_DEPTH)

    # Sketch23 → Cut-Extrude6 (cut)
    with BuildSketch(Plane(origin=(0, 29.718, 0), x_dir=(1, 0, 0), z_dir=(0, 1, 0)).offset(CUT_EXTRUDE6_START)):
        with BuildLine():
            Line((29.219405455, -37.926546486), (68.717466826, -13.502038161))
            ThreePointArc((68.717466826, -13.502038161), (76.24318, 0), (68.717466826, 13.502038161))
            Line((68.717466826, 13.502038161), (29.219405455, 37.926546486))
            Line((29.219405455, 37.926546486), (25.047860479, 40.506114482))
            ThreePointArc((25.047860479, 40.506114482), (-2.877696197, 47.537979444), (-29.75110164, 37.18887705))
            ThreePointArc((-29.75110164, 37.18887705), (-47.625, 0), (-29.75110164, -37.18887705))
            ThreePointArc((-29.75110164, -37.18887705), (-2.877696197, -47.537979444), (25.047860479, -40.506114482))
            Line((25.047860479, -40.506114482), (29.219405455, -37.926546486))
        make_face()
    extrude(amount=CUT_EXTRUDE6_DEPTH, mode=Mode.SUBTRACT)

    # Sketch24 → CSK for #2 Flat Head Socket Cap Screw1 (revolve, cut)
    with BuildSketch(Plane(origin=(22.5425, 0, -39.04475533), x_dir=(0, 0, 1), z_dir=(1, 0, 0))):
        Polygon((0, 0), (0, 1.5875), (1.2192, 1.5875), (1.2192, 1.475577556), (2.5019, 0), align=None)
    csk_for_2_flat_head_socket_cap_screw1 = revolve(axis=Axis((22.5425, 6.35, -39.04475533), (0, -1, 0)), mode=Mode.SUBTRACT)

    # CSK for #2 Flat Head Socket Cap Screw1 a: CSK for #2 Flat Head Socket Cap Screw1 ×2
    with Locations(*[Vector(-0.984807753012208, 0, 0.17364817766693103) * (i * CSK_FOR_2_FLAT_HEAD_SOCKET_CAP_SCREW1_A_PITCH) for i in range(1, CSK_FOR_2_FLAT_HEAD_SOCKET_CAP_SCREW1_A_COUNT)]):
        add(csk_for_2_flat_head_socket_cap_screw1, mode=Mode.SUBTRACT)

    # CSK for _2 Flat Head Socket Cap Scre 2: CSK for #2 Flat Head Socket Cap Screw1 ×2
    with Locations(*[Vector(-0.8660254037844379, 0, 0.5000000000000012) * (i * CSK_FOR_2_FLAT_HEAD_SOCKET_CAP_SCRE_2_PITCH) for i in range(1, CSK_FOR_2_FLAT_HEAD_SOCKET_CAP_SCRE_2_COUNT)]):
        add(csk_for_2_flat_head_socket_cap_screw1, mode=Mode.SUBTRACT)

    # CSK for _2 Flat Head Socket Cap Scre 3: CSK for #2 Flat Head Socket Cap Screw1 ×2
    with Locations(*[Vector(-0.6427876096865378, 0, 0.7660444431189793) * (i * CSK_FOR_2_FLAT_HEAD_SOCKET_CAP_SCRE_3_PITCH) for i in range(1, CSK_FOR_2_FLAT_HEAD_SOCKET_CAP_SCRE_3_COUNT)]):
        add(csk_for_2_flat_head_socket_cap_screw1, mode=Mode.SUBTRACT)

    # CSK for _2 Flat Head Socket Cap Scre 4: CSK for #2 Flat Head Socket Cap Screw1 ×2
    with Locations(*[(0, 0, i * CSK_FOR_2_FLAT_HEAD_SOCKET_CAP_SCRE_4_PITCH) for i in range(1, CSK_FOR_2_FLAT_HEAD_SOCKET_CAP_SCRE_4_COUNT)]):
        add(csk_for_2_flat_head_socket_cap_screw1, mode=Mode.SUBTRACT)

    # CSK for _2 Flat Head Socket Cap Scre 5: CSK for #2 Flat Head Socket Cap Screw1 ×2
    with Locations(*[Vector(0.6560170409199186, 0, 0.7547460778451742) * (i * CSK_FOR_2_FLAT_HEAD_SOCKET_CAP_SCRE_5_PITCH) for i in range(1, CSK_FOR_2_FLAT_HEAD_SOCKET_CAP_SCRE_5_COUNT)]):
        add(csk_for_2_flat_head_socket_cap_screw1, mode=Mode.SUBTRACT)

    # CSK for _2 Flat Head Socket Cap Scre 6: CSK for #2 Flat Head Socket Cap Screw1 ×2
    with Locations(*[Vector(0.8507305983078669, 0, 0.5256019873466412) * (i * CSK_FOR_2_FLAT_HEAD_SOCKET_CAP_SCRE_6_PITCH) for i in range(1, CSK_FOR_2_FLAT_HEAD_SOCKET_CAP_SCRE_6_COUNT)]):
        add(csk_for_2_flat_head_socket_cap_screw1, mode=Mode.SUBTRACT)

    # Sketch26 → Cut-Extrude7 (cut)
    with BuildSketch(Plane(origin=(0, 0, 0), x_dir=(1, 0, 0), z_dir=(0, 1, 0))):
        with Locations(Location((0, 0, 0), (0, 0, 270))):
            Circle(SKETCH26_R)
    extrude(amount=-CUT_EXTRUDE7_DEPTH, mode=Mode.SUBTRACT)


solid = part.part
